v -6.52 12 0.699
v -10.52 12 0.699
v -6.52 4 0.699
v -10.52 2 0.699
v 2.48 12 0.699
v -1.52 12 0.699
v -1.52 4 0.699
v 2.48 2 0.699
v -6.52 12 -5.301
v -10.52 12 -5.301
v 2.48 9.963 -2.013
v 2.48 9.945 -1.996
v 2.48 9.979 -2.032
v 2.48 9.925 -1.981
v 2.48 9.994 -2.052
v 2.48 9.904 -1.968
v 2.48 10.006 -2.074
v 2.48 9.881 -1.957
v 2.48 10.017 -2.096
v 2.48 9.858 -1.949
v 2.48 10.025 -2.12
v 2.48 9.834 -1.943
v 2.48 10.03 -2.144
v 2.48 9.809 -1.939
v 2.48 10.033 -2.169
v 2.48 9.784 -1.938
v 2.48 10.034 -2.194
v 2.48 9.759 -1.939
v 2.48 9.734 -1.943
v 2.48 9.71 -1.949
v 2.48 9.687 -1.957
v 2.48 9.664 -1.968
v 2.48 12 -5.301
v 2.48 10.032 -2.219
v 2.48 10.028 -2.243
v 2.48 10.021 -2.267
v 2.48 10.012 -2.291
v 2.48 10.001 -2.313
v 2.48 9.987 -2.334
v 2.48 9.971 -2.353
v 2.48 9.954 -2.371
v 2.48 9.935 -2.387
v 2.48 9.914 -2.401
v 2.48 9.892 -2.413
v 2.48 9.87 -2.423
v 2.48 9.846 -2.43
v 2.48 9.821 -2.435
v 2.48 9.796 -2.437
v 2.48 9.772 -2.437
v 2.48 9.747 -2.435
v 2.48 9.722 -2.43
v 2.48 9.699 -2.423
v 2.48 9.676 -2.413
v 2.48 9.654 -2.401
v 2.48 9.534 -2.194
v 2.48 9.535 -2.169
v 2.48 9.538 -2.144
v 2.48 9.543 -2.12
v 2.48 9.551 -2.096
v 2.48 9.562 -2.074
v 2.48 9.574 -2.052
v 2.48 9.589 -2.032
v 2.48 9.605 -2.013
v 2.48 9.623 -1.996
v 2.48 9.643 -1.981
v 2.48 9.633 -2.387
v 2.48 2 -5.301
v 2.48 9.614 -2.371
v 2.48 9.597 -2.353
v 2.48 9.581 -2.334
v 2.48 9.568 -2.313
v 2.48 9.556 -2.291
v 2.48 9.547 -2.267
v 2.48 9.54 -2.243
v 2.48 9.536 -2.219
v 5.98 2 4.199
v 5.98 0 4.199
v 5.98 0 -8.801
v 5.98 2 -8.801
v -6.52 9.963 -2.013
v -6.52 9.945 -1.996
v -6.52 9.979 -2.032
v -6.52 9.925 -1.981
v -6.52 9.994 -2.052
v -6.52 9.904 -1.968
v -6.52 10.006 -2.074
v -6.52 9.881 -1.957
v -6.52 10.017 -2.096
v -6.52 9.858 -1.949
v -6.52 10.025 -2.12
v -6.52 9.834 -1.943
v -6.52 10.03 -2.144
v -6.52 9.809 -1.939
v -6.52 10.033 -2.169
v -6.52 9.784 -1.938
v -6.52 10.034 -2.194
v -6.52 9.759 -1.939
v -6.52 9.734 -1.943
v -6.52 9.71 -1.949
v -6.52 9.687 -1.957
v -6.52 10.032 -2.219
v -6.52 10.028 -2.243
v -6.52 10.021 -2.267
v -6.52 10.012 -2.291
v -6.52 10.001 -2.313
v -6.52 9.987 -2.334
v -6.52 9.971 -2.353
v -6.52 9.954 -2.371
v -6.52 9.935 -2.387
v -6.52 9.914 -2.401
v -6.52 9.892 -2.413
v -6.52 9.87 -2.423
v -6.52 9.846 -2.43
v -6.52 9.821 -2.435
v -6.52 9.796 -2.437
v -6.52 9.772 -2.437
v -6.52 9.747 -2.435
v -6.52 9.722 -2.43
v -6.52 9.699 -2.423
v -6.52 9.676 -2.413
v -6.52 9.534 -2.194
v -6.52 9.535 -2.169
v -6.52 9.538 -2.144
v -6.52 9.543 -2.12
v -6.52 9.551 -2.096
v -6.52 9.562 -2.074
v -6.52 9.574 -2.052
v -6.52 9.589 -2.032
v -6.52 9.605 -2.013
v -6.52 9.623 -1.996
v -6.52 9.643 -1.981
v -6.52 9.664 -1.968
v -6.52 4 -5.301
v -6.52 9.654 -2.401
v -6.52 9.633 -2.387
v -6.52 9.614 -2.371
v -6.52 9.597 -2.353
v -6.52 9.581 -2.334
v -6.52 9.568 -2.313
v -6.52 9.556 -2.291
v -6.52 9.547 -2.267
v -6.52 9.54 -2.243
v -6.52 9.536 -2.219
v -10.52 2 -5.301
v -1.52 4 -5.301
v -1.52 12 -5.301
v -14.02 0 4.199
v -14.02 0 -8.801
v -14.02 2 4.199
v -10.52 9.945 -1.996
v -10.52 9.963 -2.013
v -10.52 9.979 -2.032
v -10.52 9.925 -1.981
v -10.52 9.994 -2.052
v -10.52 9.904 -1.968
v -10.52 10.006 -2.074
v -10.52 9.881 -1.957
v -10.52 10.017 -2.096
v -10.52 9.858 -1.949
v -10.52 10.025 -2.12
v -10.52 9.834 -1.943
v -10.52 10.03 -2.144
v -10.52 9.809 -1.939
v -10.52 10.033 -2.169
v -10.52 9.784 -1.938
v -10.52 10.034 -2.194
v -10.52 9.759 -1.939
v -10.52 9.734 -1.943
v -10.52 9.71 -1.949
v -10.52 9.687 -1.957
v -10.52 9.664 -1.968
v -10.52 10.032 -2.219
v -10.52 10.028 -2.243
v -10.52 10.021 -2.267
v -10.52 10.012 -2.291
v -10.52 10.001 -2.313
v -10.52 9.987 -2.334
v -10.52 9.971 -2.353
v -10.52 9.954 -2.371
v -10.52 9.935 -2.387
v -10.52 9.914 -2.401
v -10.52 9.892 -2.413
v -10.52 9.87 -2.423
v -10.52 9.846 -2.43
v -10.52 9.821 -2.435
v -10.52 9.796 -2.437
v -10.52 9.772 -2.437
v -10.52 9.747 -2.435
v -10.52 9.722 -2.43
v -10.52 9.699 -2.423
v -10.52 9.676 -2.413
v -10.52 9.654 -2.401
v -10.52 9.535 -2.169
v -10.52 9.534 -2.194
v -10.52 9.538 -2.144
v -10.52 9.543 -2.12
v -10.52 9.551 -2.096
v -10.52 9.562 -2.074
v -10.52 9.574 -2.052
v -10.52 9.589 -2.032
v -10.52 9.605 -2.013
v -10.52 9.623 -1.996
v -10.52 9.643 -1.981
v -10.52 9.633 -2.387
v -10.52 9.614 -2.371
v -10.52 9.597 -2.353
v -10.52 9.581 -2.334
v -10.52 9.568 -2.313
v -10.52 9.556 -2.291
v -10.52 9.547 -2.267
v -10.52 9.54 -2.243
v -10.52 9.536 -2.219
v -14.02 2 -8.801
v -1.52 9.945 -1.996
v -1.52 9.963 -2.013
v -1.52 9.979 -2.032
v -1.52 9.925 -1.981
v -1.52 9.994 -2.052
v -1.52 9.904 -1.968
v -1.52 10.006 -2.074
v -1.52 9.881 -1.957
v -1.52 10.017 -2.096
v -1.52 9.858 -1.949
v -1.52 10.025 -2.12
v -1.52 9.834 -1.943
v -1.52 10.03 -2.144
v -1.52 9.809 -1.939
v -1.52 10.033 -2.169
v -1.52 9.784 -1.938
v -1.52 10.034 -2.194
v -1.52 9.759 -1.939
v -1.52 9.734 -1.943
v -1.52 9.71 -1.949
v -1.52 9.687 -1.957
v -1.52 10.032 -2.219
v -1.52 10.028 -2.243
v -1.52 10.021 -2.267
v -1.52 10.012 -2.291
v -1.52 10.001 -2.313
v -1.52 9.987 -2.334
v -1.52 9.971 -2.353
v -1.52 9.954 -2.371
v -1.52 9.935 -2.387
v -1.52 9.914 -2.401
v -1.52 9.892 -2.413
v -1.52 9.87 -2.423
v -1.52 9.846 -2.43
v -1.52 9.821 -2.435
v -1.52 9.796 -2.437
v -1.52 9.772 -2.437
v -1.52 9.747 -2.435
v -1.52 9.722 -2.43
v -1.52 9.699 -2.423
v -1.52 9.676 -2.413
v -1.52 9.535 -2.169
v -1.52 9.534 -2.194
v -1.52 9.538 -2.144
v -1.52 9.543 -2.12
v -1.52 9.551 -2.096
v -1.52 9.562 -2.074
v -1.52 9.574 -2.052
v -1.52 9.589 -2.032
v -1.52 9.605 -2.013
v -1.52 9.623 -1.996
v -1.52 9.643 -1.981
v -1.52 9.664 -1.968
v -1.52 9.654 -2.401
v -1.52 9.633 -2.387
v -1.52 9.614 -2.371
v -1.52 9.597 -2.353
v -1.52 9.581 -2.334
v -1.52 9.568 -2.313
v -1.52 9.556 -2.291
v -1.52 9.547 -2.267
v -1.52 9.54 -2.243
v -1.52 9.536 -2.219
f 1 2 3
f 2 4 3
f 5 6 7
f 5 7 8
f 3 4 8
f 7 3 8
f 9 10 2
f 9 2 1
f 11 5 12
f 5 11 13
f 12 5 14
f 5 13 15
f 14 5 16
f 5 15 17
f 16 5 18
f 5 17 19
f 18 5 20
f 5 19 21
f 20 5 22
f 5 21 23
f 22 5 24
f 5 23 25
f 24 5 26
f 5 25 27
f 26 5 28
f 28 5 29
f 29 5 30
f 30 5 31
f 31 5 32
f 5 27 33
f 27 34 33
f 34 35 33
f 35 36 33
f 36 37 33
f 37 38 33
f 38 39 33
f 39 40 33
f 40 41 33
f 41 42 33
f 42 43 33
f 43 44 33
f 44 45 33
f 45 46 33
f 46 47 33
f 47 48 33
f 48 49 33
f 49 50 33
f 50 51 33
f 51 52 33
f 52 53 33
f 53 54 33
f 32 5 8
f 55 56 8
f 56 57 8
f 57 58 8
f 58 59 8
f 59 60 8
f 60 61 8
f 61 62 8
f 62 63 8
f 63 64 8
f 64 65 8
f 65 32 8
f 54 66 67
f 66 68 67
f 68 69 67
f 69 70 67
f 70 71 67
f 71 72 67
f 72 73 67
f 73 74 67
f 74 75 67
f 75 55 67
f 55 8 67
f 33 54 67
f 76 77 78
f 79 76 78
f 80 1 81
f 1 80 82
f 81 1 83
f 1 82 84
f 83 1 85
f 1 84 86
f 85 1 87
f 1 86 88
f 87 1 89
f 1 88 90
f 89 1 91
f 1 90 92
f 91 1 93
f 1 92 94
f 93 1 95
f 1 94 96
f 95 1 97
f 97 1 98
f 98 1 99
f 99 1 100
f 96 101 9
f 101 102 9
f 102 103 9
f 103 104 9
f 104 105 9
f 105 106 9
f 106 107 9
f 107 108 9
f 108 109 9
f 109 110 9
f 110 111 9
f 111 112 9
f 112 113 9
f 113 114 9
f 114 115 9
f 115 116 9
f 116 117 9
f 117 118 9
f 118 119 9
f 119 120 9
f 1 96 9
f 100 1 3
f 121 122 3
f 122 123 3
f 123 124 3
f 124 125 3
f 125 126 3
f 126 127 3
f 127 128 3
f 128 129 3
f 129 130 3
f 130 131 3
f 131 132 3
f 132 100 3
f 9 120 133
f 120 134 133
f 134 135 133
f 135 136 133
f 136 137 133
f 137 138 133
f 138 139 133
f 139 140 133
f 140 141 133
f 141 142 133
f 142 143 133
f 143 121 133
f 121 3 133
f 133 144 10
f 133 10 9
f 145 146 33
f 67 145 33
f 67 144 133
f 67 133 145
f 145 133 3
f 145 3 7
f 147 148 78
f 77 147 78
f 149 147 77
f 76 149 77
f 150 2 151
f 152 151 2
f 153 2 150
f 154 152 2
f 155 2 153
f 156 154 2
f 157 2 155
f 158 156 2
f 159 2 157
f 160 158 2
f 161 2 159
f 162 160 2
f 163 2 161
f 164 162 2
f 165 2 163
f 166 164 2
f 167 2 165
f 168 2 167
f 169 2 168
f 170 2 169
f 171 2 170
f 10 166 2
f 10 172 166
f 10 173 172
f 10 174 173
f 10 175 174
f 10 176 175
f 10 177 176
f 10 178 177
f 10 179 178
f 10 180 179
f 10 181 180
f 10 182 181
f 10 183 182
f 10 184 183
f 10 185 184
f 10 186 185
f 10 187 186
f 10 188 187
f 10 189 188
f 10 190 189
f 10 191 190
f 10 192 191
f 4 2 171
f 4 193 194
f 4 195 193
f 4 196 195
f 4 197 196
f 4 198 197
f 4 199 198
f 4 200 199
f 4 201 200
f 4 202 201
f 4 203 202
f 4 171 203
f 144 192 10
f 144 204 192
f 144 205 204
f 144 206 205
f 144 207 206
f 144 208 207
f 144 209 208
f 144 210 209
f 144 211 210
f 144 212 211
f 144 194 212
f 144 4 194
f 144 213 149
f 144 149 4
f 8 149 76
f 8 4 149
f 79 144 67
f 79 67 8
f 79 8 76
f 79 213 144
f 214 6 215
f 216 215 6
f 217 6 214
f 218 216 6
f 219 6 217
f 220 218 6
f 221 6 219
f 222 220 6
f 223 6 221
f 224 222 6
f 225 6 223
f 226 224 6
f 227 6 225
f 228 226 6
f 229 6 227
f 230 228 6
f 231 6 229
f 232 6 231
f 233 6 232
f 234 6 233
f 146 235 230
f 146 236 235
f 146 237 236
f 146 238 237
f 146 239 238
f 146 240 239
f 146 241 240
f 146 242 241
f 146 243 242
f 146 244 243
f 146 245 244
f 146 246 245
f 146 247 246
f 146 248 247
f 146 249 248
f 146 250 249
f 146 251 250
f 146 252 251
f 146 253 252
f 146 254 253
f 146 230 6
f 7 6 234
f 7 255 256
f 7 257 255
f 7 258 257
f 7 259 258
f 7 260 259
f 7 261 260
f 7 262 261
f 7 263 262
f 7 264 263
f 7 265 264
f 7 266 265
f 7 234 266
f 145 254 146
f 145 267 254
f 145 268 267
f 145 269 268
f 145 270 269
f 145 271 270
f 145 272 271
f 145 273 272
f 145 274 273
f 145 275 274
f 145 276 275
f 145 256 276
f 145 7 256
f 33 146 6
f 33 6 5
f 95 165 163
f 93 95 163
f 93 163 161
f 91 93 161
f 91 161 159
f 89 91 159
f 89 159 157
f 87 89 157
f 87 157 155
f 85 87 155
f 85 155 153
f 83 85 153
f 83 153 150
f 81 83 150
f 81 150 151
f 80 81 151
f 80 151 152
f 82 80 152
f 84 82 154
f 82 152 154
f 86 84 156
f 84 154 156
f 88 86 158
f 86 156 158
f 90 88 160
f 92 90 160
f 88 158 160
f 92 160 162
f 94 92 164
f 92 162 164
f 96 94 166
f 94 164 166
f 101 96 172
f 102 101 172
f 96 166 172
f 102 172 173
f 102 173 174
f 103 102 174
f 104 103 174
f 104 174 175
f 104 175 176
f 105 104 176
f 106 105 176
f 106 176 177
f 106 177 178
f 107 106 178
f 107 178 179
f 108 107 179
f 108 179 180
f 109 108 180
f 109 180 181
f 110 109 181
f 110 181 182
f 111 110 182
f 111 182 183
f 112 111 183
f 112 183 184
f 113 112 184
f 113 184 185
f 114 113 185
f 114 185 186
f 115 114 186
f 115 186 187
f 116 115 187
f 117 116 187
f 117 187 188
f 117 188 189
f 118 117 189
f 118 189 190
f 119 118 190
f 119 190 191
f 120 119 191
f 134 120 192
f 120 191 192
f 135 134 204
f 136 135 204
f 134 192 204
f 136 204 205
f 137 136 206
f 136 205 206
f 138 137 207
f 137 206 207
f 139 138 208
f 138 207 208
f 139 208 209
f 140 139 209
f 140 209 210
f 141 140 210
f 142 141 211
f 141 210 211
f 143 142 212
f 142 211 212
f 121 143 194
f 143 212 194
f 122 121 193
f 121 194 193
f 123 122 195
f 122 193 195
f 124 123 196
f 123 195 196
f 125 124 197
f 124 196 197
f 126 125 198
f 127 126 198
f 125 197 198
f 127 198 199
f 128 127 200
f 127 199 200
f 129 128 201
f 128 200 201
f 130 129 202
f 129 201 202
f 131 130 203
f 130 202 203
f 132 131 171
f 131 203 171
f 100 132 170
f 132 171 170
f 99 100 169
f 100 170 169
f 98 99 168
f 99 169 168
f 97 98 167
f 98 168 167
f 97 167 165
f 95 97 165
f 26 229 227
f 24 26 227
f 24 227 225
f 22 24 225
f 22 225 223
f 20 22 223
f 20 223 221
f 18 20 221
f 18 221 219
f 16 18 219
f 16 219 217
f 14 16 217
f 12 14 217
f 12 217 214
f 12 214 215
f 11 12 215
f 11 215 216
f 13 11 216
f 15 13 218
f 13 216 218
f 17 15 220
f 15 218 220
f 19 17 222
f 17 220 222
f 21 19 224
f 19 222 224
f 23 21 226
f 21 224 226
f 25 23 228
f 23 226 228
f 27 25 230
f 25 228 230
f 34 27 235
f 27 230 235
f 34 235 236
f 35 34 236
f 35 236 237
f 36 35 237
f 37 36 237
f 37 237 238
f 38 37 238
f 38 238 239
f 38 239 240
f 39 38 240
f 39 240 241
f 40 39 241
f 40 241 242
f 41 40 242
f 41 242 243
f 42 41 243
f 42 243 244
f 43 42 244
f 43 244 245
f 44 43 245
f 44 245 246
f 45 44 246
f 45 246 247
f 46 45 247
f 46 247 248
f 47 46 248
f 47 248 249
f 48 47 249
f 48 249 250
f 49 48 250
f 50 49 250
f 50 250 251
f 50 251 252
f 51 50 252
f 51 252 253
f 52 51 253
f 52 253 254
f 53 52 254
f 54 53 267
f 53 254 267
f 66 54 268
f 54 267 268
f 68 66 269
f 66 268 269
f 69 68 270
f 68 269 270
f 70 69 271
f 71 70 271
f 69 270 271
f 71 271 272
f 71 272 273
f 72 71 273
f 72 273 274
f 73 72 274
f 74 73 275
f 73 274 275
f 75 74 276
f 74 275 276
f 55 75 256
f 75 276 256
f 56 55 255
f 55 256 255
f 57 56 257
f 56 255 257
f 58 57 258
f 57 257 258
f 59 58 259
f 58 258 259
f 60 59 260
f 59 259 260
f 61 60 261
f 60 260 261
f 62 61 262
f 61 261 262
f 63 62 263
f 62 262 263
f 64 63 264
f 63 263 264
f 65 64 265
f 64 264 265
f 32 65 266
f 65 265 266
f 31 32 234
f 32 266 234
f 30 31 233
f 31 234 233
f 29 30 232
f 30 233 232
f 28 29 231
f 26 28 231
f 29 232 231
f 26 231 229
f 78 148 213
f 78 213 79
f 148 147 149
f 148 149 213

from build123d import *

# Parameters (mm, degrees)
SKETCH_1_W          = 20
SKETCH_1_H          = 13
EXTRUDE_1_DEPTH     = 2
SKETCH_2_W          = 13
SKETCH_2_H          = 6
EXTRUDE_2_DEPTH     = 2
SKETCH_3_W          = 4
SKETCH_3_H          = 6
EXTRUDE_3_DEPTH     = 8
SKETCH_4_R          = 0.25
CUT_EXTRUDE_1_DEPTH = 23.21940351


with BuildPart() as part:
    # 草图1 → 凸台-拉伸1 (new body)
    with BuildSketch(Plane(origin=(0, 0, 0), x_dir=(1, 0, 0), z_dir=(0, 1, 0))):
        with Locations((-4.02027027, 2.300675676)):
            Rectangle(SKETCH_1_W, SKETCH_1_H)
    extrude(amount=EXTRUDE_1_DEPTH)

    # 草图2 → 凸台-拉伸2 (add)
    with BuildSketch(Plane(origin=(0, 2, 0), x_dir=(1, 0, 0), z_dir=(0, 1, 0))):
        with Locations((-4.02027027, 2.300675676)):
            Rectangle(SKETCH_2_W, SKETCH_2_H)
    extrude(amount=EXTRUDE_2_DEPTH)

    # 草图3 → 凸台-拉伸3 (add)
    with BuildSketch(Plane(origin=(0, 4, 0), x_dir=(1, 0, 0), z_dir=(0, 1, 0))):
        with Locations((-8.52027027, 2.300675676)):
            Rectangle(SKETCH_3_W, SKETCH_3_H)
        with Locations((0.47972973, 2.300675676)):
            Rectangle(SKETCH_3_W, SKETCH_3_H)
    extrude(amount=EXTRUDE_3_DEPTH)

    # 草图4 → 切除-拉伸1 (cut, through all)
    with BuildSketch(Plane.ZY.offset(10.52027027)):
        with Locations((-2.187687032, 9.784017998)):
            Circle(SKETCH_4_R)
    extrude(amount=-CUT_EXTRUDE_1_DEPTH, mode=Mode.SUBTRACT)


solid = part.part
